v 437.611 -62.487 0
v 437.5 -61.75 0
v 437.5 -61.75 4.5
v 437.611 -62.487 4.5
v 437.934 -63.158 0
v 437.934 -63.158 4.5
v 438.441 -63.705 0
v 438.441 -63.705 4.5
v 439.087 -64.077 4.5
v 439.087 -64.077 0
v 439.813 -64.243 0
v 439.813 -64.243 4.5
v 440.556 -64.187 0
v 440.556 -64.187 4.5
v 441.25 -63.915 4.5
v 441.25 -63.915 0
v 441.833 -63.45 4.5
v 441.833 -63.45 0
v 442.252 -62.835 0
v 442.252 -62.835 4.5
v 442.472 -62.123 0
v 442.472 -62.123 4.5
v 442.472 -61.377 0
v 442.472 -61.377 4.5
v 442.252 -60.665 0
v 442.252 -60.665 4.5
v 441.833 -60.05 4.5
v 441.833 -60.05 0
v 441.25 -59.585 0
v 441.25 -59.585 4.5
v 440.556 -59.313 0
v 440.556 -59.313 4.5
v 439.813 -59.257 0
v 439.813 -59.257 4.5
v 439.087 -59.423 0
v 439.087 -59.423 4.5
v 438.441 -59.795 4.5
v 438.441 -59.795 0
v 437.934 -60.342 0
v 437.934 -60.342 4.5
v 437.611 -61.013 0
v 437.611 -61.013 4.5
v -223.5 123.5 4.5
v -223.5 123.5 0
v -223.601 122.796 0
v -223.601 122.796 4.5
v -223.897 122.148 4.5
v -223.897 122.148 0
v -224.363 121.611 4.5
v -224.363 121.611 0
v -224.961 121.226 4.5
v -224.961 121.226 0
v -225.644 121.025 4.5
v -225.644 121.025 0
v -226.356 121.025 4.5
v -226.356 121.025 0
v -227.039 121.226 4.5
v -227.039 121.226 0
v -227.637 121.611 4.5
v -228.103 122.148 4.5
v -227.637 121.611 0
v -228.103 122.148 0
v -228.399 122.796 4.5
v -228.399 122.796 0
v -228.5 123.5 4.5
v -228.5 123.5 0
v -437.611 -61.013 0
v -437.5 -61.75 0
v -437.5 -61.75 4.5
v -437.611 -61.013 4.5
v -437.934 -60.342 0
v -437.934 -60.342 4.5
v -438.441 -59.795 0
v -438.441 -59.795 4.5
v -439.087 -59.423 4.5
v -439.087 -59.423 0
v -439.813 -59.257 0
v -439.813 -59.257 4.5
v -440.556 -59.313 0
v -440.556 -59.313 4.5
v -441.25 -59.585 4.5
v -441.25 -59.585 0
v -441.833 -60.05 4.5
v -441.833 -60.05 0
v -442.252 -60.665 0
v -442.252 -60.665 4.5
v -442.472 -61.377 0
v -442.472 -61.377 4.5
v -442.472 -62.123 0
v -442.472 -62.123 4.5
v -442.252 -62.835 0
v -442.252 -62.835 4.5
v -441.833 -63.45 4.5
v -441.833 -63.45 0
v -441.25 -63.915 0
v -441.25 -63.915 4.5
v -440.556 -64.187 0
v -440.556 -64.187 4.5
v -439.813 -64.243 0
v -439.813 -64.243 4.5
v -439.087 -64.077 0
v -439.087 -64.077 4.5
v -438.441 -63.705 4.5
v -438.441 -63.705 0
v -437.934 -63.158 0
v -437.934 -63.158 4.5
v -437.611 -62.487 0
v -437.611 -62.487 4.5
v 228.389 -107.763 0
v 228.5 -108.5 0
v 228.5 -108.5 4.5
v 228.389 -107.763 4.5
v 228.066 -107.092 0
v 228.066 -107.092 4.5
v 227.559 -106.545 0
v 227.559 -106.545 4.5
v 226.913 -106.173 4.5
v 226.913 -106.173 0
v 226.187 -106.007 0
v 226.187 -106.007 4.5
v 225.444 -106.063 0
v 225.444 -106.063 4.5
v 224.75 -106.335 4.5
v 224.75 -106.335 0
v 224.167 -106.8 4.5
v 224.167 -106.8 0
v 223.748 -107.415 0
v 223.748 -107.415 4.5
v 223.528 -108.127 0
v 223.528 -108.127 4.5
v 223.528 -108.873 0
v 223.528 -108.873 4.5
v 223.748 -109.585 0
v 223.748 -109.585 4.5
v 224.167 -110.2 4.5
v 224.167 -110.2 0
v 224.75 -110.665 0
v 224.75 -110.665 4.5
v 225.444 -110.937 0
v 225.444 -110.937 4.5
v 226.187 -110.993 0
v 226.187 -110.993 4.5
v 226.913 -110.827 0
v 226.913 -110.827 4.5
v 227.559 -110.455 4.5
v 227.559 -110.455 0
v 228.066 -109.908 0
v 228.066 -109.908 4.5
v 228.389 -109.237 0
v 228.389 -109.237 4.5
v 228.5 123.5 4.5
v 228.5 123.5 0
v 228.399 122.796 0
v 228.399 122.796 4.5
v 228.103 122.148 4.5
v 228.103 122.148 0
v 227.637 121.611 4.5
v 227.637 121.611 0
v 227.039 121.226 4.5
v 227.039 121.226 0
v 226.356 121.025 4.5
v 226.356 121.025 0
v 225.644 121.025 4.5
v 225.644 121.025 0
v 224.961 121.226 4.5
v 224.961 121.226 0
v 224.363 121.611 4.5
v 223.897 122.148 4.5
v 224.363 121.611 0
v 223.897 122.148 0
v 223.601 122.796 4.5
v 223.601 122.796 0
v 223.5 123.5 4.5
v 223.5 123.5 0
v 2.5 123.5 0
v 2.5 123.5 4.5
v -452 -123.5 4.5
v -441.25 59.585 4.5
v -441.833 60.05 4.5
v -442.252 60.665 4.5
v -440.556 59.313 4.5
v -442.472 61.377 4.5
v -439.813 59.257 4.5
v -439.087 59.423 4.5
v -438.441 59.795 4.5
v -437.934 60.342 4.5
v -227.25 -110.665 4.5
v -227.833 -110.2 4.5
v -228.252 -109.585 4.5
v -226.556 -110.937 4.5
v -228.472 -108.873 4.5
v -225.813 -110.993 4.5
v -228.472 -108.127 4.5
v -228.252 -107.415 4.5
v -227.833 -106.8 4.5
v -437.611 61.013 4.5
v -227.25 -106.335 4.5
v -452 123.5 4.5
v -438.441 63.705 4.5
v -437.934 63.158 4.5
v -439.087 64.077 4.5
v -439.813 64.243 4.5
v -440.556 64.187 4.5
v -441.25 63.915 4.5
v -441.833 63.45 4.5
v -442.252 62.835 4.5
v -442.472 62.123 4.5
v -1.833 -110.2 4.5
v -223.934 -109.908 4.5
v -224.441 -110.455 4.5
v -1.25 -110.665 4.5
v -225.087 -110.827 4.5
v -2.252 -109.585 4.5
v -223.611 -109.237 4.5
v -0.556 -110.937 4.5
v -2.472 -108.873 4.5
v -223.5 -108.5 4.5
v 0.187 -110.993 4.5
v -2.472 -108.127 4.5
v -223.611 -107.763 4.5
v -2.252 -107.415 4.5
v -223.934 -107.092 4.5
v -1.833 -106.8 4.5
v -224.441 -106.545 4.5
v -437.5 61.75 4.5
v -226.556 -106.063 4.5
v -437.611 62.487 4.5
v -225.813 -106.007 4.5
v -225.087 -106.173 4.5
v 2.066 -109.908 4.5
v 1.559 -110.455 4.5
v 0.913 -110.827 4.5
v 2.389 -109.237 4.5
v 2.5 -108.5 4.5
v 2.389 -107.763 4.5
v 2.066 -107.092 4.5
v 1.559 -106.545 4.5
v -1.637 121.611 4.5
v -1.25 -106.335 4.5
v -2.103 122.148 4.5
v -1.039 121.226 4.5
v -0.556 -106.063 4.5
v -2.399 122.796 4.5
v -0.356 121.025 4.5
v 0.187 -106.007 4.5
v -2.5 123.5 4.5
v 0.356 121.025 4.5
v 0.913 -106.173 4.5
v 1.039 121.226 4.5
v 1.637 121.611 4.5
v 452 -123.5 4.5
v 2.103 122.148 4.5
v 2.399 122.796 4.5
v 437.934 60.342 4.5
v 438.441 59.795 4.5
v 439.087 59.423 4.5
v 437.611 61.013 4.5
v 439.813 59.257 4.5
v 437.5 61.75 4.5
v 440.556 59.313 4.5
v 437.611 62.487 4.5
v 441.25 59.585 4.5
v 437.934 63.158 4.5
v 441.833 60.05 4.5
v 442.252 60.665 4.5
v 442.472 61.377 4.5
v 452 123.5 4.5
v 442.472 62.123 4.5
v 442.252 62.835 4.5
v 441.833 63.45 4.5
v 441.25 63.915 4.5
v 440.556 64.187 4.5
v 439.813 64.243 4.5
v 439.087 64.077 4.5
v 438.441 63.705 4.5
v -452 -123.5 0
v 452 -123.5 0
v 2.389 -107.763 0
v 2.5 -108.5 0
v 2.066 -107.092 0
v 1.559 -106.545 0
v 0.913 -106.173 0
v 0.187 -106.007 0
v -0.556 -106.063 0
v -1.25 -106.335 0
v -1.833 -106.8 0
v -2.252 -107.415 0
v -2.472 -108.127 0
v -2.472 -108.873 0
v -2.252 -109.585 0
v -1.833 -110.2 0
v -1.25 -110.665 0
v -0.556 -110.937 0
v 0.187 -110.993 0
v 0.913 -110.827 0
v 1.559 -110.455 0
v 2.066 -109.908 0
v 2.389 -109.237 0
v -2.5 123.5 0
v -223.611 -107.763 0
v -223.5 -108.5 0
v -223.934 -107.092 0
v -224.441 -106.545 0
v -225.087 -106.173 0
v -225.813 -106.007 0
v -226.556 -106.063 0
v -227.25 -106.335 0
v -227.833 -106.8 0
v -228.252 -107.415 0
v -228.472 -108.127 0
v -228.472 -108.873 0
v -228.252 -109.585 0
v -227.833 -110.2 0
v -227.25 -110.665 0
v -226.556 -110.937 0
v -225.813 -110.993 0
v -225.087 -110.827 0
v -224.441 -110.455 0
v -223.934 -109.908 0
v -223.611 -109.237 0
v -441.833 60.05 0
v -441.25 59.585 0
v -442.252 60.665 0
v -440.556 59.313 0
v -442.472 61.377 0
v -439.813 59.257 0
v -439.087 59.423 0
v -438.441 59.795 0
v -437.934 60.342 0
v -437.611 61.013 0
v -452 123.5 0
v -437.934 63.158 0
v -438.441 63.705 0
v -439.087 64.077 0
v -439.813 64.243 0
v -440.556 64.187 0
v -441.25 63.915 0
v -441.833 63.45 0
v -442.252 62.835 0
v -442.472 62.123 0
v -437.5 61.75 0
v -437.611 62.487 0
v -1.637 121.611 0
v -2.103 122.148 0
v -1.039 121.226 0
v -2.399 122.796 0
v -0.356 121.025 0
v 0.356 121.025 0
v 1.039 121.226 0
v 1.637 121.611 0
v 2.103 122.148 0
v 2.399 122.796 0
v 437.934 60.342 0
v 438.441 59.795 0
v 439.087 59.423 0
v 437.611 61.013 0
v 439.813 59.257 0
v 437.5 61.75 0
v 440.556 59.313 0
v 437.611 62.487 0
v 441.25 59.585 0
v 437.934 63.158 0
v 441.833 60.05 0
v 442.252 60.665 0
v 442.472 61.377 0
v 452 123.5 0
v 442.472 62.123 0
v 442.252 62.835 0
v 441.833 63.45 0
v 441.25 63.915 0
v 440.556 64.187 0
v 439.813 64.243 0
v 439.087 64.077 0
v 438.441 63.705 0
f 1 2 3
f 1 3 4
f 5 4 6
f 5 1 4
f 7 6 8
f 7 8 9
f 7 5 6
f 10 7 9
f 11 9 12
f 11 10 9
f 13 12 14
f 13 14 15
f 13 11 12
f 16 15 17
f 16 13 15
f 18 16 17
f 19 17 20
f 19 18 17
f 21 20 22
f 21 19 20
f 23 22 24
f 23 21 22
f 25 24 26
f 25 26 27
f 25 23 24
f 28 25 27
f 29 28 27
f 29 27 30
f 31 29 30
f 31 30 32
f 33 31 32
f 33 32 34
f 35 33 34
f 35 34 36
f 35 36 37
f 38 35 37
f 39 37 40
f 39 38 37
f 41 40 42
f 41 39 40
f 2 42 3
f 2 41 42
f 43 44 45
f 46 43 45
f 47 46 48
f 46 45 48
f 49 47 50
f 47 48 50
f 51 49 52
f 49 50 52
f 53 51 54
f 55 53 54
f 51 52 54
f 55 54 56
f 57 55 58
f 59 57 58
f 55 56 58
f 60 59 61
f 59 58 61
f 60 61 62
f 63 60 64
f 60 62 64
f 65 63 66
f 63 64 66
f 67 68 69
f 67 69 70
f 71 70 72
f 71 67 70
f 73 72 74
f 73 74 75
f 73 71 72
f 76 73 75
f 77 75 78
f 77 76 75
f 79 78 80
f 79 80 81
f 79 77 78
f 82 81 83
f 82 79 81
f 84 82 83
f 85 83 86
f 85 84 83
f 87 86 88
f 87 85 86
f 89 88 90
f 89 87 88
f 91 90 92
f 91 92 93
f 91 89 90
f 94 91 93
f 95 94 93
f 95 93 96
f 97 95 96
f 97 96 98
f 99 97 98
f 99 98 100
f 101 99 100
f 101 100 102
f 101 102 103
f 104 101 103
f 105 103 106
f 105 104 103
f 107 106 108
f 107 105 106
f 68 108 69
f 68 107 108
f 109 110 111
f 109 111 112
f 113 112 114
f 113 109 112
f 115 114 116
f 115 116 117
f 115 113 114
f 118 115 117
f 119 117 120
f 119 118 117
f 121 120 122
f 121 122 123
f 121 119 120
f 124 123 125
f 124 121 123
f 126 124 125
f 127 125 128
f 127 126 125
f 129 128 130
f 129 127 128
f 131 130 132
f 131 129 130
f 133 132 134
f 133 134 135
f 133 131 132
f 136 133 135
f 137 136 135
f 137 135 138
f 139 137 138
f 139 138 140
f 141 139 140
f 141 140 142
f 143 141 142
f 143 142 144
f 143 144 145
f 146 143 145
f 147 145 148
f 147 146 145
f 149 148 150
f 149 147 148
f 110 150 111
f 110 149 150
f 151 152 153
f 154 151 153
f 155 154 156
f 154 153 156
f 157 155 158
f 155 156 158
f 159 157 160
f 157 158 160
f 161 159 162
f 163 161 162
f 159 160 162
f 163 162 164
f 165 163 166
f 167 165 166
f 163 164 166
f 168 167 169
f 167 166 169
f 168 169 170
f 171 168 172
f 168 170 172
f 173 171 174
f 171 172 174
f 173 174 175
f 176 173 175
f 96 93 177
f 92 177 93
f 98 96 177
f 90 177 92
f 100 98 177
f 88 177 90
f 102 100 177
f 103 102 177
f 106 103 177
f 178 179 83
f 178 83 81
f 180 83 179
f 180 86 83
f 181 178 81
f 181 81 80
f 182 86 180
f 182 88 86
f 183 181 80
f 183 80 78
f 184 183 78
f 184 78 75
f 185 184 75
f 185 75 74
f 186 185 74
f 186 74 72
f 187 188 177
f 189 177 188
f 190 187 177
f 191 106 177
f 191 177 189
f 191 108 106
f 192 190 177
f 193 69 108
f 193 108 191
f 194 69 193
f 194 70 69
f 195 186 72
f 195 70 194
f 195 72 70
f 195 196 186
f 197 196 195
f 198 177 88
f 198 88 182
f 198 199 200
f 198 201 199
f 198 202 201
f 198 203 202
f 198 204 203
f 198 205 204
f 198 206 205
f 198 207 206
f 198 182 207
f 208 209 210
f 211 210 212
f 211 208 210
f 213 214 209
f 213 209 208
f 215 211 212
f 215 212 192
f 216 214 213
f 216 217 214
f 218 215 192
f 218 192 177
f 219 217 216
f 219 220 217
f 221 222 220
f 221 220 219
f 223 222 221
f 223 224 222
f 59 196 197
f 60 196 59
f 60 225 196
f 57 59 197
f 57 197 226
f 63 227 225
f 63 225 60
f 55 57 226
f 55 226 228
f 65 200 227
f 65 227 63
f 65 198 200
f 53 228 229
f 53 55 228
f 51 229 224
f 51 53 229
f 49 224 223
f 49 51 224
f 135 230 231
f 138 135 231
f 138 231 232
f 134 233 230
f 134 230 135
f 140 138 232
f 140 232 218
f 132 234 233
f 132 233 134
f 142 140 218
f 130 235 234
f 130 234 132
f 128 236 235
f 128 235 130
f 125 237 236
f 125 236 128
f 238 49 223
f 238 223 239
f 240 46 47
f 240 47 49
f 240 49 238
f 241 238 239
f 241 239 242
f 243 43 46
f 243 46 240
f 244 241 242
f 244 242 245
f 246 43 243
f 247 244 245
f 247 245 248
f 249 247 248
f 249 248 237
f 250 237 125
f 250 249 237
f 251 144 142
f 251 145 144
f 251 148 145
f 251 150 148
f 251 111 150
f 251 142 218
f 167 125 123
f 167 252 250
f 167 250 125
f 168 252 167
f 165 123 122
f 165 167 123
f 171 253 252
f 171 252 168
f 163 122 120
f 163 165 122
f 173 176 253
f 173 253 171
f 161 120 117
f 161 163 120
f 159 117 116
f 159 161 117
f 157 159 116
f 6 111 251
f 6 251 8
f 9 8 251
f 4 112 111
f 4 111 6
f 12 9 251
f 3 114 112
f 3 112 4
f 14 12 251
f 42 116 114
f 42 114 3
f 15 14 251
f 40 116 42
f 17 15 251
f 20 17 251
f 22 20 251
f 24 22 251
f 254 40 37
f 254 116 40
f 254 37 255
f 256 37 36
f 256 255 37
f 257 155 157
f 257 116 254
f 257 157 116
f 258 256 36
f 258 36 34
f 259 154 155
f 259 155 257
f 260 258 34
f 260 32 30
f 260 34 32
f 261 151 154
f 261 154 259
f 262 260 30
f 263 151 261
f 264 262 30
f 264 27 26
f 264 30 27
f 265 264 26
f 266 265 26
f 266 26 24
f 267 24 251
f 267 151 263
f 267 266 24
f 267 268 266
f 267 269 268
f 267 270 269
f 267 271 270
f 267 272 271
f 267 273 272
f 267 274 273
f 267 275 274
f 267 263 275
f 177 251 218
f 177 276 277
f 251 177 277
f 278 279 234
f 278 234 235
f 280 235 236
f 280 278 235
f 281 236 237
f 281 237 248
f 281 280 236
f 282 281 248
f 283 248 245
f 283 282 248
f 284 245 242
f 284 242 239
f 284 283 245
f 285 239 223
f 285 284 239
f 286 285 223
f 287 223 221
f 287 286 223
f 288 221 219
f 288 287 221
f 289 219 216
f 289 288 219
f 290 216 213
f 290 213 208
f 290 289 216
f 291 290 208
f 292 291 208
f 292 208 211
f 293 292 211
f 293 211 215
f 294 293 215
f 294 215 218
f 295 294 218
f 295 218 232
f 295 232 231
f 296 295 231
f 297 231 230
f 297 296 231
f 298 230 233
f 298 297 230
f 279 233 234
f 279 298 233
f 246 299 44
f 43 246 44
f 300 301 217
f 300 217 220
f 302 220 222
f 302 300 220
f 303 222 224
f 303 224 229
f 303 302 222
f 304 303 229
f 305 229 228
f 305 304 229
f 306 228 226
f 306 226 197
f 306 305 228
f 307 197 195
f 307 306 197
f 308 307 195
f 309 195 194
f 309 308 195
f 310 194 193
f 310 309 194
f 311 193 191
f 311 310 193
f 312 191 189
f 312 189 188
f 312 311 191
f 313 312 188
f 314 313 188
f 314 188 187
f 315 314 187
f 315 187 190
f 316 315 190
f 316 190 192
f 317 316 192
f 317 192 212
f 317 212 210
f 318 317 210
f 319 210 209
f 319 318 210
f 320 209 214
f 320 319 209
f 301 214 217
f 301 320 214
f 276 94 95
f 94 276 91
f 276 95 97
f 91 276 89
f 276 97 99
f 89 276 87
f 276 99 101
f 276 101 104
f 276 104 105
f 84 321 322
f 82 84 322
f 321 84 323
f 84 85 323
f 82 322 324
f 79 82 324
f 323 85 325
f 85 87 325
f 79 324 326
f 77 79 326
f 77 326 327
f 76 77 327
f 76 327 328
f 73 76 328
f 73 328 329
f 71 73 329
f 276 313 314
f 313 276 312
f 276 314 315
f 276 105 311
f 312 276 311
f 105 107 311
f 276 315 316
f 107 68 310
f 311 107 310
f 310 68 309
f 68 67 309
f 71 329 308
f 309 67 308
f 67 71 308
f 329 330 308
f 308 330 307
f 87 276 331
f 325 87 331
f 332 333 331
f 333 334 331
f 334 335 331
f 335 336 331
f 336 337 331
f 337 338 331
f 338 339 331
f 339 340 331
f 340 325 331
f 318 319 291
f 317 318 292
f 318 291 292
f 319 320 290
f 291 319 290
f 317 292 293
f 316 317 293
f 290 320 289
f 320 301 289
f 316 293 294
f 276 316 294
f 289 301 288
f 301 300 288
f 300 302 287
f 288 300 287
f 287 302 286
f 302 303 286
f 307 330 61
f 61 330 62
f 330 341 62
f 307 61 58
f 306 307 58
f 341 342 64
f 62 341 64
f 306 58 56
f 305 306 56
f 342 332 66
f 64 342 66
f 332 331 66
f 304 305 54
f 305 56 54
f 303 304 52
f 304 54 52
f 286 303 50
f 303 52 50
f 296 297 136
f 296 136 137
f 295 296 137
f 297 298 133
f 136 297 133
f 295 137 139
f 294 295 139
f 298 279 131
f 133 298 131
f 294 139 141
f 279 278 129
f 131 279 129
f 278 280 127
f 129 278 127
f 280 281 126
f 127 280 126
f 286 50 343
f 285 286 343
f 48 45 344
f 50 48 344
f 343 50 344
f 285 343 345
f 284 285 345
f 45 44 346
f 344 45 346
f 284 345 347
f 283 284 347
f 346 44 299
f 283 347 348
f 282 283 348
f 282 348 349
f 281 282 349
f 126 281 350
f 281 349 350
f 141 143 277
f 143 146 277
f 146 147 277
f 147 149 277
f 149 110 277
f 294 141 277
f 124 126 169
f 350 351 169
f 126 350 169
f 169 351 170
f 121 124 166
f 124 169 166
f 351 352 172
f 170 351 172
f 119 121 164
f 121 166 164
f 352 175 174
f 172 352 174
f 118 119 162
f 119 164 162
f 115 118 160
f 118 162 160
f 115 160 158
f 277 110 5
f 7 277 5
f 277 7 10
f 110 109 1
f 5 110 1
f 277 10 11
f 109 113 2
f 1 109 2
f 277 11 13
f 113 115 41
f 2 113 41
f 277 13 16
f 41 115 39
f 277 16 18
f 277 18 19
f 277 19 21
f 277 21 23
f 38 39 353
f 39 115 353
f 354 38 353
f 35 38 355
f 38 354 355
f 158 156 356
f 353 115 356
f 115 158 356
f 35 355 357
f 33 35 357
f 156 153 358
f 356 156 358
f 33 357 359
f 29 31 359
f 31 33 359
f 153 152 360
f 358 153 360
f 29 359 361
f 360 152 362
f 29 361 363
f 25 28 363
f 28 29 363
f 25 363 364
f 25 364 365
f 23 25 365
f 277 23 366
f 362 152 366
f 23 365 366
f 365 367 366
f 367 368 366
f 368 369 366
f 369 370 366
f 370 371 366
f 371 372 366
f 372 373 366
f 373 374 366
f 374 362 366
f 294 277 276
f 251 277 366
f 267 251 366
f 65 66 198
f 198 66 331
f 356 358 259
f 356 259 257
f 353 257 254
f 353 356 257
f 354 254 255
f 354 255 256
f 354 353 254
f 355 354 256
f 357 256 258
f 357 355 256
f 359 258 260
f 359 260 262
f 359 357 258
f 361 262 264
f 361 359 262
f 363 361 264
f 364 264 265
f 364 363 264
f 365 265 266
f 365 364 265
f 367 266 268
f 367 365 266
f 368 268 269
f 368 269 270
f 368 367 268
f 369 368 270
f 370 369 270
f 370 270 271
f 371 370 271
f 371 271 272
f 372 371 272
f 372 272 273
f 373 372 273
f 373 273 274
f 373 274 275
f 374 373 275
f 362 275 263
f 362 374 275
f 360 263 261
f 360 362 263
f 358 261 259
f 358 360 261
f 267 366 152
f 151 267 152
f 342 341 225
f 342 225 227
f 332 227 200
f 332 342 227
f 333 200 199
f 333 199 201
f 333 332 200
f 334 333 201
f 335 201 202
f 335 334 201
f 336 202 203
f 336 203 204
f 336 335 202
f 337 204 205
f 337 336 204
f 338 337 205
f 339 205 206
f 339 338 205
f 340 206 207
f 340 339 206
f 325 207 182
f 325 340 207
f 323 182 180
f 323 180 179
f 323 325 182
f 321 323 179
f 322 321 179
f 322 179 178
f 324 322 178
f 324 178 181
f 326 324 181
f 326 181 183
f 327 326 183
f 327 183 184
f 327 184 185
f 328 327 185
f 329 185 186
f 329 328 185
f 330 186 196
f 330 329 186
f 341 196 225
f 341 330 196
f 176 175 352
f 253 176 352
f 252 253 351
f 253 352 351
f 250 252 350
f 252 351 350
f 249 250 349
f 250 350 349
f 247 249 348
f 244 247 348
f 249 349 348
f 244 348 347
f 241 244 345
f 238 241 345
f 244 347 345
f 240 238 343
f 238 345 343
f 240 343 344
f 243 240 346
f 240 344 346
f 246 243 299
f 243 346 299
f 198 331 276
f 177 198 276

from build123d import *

# Parameters (mm, degrees)
SKETCH1_R           = 2.5
BOSS_EXTRUDE1_DEPTH = 4.5


with BuildPart() as part:
    # Sketch1 → Boss-Extrude1 (new body)
    with BuildSketch(Plane.XY):
        with BuildLine():
            Line((-452, 123.5), (-452, -123.5))
            Line((-452, -123.5), (452, -123.5))
            Line((452, -123.5), (452, 123.5))
            Line((452, 123.5), (228.5, 123.5))
            ThreePointArc((228.5, 123.5), (226, 121), (223.5, 123.5))
            Line((223.5, 123.5), (2.5, 123.5))
            ThreePointArc((2.5, 123.5), (0, 121), (-2.5, 123.5))
            Line((-2.5, 123.5), (-223.5, 123.5))
            ThreePointArc((-223.5, 123.5), (-226, 121), (-228.5, 123.5))
            Line((-228.5, 123.5), (-452, 123.5))
        make_face()
        with Locations((-440, 61.75)):
            Circle(SKETCH1_R, mode=Mode.SUBTRACT)
        with Locations((-440, -61.75)):
            Circle(SKETCH1_R, mode=Mode.SUBTRACT)
        with Locations(Location((440, -61.75, 0), (0, 0, 180))):
            Circle(SKETCH1_R, mode=Mode.SUBTRACT)
        with Locations(Location((440, 61.75, 0), (0, 0, 180))):
            Circle(SKETCH1_R, mode=Mode.SUBTRACT)
        with Locations((0, -108.5)):
            Circle(SKETCH1_R, mode=Mode.SUBTRACT)
        with Locations((226, -108.5)):
            Circle(SKETCH1_R, mode=Mode.SUBTRACT)
        with Locations((-226, -108.5)):
            Circle(SKETCH1_R, mode=Mode.SUBTRACT)
    extrude(amount=BOSS_EXTRUDE1_DEPTH)


solid = part.part
